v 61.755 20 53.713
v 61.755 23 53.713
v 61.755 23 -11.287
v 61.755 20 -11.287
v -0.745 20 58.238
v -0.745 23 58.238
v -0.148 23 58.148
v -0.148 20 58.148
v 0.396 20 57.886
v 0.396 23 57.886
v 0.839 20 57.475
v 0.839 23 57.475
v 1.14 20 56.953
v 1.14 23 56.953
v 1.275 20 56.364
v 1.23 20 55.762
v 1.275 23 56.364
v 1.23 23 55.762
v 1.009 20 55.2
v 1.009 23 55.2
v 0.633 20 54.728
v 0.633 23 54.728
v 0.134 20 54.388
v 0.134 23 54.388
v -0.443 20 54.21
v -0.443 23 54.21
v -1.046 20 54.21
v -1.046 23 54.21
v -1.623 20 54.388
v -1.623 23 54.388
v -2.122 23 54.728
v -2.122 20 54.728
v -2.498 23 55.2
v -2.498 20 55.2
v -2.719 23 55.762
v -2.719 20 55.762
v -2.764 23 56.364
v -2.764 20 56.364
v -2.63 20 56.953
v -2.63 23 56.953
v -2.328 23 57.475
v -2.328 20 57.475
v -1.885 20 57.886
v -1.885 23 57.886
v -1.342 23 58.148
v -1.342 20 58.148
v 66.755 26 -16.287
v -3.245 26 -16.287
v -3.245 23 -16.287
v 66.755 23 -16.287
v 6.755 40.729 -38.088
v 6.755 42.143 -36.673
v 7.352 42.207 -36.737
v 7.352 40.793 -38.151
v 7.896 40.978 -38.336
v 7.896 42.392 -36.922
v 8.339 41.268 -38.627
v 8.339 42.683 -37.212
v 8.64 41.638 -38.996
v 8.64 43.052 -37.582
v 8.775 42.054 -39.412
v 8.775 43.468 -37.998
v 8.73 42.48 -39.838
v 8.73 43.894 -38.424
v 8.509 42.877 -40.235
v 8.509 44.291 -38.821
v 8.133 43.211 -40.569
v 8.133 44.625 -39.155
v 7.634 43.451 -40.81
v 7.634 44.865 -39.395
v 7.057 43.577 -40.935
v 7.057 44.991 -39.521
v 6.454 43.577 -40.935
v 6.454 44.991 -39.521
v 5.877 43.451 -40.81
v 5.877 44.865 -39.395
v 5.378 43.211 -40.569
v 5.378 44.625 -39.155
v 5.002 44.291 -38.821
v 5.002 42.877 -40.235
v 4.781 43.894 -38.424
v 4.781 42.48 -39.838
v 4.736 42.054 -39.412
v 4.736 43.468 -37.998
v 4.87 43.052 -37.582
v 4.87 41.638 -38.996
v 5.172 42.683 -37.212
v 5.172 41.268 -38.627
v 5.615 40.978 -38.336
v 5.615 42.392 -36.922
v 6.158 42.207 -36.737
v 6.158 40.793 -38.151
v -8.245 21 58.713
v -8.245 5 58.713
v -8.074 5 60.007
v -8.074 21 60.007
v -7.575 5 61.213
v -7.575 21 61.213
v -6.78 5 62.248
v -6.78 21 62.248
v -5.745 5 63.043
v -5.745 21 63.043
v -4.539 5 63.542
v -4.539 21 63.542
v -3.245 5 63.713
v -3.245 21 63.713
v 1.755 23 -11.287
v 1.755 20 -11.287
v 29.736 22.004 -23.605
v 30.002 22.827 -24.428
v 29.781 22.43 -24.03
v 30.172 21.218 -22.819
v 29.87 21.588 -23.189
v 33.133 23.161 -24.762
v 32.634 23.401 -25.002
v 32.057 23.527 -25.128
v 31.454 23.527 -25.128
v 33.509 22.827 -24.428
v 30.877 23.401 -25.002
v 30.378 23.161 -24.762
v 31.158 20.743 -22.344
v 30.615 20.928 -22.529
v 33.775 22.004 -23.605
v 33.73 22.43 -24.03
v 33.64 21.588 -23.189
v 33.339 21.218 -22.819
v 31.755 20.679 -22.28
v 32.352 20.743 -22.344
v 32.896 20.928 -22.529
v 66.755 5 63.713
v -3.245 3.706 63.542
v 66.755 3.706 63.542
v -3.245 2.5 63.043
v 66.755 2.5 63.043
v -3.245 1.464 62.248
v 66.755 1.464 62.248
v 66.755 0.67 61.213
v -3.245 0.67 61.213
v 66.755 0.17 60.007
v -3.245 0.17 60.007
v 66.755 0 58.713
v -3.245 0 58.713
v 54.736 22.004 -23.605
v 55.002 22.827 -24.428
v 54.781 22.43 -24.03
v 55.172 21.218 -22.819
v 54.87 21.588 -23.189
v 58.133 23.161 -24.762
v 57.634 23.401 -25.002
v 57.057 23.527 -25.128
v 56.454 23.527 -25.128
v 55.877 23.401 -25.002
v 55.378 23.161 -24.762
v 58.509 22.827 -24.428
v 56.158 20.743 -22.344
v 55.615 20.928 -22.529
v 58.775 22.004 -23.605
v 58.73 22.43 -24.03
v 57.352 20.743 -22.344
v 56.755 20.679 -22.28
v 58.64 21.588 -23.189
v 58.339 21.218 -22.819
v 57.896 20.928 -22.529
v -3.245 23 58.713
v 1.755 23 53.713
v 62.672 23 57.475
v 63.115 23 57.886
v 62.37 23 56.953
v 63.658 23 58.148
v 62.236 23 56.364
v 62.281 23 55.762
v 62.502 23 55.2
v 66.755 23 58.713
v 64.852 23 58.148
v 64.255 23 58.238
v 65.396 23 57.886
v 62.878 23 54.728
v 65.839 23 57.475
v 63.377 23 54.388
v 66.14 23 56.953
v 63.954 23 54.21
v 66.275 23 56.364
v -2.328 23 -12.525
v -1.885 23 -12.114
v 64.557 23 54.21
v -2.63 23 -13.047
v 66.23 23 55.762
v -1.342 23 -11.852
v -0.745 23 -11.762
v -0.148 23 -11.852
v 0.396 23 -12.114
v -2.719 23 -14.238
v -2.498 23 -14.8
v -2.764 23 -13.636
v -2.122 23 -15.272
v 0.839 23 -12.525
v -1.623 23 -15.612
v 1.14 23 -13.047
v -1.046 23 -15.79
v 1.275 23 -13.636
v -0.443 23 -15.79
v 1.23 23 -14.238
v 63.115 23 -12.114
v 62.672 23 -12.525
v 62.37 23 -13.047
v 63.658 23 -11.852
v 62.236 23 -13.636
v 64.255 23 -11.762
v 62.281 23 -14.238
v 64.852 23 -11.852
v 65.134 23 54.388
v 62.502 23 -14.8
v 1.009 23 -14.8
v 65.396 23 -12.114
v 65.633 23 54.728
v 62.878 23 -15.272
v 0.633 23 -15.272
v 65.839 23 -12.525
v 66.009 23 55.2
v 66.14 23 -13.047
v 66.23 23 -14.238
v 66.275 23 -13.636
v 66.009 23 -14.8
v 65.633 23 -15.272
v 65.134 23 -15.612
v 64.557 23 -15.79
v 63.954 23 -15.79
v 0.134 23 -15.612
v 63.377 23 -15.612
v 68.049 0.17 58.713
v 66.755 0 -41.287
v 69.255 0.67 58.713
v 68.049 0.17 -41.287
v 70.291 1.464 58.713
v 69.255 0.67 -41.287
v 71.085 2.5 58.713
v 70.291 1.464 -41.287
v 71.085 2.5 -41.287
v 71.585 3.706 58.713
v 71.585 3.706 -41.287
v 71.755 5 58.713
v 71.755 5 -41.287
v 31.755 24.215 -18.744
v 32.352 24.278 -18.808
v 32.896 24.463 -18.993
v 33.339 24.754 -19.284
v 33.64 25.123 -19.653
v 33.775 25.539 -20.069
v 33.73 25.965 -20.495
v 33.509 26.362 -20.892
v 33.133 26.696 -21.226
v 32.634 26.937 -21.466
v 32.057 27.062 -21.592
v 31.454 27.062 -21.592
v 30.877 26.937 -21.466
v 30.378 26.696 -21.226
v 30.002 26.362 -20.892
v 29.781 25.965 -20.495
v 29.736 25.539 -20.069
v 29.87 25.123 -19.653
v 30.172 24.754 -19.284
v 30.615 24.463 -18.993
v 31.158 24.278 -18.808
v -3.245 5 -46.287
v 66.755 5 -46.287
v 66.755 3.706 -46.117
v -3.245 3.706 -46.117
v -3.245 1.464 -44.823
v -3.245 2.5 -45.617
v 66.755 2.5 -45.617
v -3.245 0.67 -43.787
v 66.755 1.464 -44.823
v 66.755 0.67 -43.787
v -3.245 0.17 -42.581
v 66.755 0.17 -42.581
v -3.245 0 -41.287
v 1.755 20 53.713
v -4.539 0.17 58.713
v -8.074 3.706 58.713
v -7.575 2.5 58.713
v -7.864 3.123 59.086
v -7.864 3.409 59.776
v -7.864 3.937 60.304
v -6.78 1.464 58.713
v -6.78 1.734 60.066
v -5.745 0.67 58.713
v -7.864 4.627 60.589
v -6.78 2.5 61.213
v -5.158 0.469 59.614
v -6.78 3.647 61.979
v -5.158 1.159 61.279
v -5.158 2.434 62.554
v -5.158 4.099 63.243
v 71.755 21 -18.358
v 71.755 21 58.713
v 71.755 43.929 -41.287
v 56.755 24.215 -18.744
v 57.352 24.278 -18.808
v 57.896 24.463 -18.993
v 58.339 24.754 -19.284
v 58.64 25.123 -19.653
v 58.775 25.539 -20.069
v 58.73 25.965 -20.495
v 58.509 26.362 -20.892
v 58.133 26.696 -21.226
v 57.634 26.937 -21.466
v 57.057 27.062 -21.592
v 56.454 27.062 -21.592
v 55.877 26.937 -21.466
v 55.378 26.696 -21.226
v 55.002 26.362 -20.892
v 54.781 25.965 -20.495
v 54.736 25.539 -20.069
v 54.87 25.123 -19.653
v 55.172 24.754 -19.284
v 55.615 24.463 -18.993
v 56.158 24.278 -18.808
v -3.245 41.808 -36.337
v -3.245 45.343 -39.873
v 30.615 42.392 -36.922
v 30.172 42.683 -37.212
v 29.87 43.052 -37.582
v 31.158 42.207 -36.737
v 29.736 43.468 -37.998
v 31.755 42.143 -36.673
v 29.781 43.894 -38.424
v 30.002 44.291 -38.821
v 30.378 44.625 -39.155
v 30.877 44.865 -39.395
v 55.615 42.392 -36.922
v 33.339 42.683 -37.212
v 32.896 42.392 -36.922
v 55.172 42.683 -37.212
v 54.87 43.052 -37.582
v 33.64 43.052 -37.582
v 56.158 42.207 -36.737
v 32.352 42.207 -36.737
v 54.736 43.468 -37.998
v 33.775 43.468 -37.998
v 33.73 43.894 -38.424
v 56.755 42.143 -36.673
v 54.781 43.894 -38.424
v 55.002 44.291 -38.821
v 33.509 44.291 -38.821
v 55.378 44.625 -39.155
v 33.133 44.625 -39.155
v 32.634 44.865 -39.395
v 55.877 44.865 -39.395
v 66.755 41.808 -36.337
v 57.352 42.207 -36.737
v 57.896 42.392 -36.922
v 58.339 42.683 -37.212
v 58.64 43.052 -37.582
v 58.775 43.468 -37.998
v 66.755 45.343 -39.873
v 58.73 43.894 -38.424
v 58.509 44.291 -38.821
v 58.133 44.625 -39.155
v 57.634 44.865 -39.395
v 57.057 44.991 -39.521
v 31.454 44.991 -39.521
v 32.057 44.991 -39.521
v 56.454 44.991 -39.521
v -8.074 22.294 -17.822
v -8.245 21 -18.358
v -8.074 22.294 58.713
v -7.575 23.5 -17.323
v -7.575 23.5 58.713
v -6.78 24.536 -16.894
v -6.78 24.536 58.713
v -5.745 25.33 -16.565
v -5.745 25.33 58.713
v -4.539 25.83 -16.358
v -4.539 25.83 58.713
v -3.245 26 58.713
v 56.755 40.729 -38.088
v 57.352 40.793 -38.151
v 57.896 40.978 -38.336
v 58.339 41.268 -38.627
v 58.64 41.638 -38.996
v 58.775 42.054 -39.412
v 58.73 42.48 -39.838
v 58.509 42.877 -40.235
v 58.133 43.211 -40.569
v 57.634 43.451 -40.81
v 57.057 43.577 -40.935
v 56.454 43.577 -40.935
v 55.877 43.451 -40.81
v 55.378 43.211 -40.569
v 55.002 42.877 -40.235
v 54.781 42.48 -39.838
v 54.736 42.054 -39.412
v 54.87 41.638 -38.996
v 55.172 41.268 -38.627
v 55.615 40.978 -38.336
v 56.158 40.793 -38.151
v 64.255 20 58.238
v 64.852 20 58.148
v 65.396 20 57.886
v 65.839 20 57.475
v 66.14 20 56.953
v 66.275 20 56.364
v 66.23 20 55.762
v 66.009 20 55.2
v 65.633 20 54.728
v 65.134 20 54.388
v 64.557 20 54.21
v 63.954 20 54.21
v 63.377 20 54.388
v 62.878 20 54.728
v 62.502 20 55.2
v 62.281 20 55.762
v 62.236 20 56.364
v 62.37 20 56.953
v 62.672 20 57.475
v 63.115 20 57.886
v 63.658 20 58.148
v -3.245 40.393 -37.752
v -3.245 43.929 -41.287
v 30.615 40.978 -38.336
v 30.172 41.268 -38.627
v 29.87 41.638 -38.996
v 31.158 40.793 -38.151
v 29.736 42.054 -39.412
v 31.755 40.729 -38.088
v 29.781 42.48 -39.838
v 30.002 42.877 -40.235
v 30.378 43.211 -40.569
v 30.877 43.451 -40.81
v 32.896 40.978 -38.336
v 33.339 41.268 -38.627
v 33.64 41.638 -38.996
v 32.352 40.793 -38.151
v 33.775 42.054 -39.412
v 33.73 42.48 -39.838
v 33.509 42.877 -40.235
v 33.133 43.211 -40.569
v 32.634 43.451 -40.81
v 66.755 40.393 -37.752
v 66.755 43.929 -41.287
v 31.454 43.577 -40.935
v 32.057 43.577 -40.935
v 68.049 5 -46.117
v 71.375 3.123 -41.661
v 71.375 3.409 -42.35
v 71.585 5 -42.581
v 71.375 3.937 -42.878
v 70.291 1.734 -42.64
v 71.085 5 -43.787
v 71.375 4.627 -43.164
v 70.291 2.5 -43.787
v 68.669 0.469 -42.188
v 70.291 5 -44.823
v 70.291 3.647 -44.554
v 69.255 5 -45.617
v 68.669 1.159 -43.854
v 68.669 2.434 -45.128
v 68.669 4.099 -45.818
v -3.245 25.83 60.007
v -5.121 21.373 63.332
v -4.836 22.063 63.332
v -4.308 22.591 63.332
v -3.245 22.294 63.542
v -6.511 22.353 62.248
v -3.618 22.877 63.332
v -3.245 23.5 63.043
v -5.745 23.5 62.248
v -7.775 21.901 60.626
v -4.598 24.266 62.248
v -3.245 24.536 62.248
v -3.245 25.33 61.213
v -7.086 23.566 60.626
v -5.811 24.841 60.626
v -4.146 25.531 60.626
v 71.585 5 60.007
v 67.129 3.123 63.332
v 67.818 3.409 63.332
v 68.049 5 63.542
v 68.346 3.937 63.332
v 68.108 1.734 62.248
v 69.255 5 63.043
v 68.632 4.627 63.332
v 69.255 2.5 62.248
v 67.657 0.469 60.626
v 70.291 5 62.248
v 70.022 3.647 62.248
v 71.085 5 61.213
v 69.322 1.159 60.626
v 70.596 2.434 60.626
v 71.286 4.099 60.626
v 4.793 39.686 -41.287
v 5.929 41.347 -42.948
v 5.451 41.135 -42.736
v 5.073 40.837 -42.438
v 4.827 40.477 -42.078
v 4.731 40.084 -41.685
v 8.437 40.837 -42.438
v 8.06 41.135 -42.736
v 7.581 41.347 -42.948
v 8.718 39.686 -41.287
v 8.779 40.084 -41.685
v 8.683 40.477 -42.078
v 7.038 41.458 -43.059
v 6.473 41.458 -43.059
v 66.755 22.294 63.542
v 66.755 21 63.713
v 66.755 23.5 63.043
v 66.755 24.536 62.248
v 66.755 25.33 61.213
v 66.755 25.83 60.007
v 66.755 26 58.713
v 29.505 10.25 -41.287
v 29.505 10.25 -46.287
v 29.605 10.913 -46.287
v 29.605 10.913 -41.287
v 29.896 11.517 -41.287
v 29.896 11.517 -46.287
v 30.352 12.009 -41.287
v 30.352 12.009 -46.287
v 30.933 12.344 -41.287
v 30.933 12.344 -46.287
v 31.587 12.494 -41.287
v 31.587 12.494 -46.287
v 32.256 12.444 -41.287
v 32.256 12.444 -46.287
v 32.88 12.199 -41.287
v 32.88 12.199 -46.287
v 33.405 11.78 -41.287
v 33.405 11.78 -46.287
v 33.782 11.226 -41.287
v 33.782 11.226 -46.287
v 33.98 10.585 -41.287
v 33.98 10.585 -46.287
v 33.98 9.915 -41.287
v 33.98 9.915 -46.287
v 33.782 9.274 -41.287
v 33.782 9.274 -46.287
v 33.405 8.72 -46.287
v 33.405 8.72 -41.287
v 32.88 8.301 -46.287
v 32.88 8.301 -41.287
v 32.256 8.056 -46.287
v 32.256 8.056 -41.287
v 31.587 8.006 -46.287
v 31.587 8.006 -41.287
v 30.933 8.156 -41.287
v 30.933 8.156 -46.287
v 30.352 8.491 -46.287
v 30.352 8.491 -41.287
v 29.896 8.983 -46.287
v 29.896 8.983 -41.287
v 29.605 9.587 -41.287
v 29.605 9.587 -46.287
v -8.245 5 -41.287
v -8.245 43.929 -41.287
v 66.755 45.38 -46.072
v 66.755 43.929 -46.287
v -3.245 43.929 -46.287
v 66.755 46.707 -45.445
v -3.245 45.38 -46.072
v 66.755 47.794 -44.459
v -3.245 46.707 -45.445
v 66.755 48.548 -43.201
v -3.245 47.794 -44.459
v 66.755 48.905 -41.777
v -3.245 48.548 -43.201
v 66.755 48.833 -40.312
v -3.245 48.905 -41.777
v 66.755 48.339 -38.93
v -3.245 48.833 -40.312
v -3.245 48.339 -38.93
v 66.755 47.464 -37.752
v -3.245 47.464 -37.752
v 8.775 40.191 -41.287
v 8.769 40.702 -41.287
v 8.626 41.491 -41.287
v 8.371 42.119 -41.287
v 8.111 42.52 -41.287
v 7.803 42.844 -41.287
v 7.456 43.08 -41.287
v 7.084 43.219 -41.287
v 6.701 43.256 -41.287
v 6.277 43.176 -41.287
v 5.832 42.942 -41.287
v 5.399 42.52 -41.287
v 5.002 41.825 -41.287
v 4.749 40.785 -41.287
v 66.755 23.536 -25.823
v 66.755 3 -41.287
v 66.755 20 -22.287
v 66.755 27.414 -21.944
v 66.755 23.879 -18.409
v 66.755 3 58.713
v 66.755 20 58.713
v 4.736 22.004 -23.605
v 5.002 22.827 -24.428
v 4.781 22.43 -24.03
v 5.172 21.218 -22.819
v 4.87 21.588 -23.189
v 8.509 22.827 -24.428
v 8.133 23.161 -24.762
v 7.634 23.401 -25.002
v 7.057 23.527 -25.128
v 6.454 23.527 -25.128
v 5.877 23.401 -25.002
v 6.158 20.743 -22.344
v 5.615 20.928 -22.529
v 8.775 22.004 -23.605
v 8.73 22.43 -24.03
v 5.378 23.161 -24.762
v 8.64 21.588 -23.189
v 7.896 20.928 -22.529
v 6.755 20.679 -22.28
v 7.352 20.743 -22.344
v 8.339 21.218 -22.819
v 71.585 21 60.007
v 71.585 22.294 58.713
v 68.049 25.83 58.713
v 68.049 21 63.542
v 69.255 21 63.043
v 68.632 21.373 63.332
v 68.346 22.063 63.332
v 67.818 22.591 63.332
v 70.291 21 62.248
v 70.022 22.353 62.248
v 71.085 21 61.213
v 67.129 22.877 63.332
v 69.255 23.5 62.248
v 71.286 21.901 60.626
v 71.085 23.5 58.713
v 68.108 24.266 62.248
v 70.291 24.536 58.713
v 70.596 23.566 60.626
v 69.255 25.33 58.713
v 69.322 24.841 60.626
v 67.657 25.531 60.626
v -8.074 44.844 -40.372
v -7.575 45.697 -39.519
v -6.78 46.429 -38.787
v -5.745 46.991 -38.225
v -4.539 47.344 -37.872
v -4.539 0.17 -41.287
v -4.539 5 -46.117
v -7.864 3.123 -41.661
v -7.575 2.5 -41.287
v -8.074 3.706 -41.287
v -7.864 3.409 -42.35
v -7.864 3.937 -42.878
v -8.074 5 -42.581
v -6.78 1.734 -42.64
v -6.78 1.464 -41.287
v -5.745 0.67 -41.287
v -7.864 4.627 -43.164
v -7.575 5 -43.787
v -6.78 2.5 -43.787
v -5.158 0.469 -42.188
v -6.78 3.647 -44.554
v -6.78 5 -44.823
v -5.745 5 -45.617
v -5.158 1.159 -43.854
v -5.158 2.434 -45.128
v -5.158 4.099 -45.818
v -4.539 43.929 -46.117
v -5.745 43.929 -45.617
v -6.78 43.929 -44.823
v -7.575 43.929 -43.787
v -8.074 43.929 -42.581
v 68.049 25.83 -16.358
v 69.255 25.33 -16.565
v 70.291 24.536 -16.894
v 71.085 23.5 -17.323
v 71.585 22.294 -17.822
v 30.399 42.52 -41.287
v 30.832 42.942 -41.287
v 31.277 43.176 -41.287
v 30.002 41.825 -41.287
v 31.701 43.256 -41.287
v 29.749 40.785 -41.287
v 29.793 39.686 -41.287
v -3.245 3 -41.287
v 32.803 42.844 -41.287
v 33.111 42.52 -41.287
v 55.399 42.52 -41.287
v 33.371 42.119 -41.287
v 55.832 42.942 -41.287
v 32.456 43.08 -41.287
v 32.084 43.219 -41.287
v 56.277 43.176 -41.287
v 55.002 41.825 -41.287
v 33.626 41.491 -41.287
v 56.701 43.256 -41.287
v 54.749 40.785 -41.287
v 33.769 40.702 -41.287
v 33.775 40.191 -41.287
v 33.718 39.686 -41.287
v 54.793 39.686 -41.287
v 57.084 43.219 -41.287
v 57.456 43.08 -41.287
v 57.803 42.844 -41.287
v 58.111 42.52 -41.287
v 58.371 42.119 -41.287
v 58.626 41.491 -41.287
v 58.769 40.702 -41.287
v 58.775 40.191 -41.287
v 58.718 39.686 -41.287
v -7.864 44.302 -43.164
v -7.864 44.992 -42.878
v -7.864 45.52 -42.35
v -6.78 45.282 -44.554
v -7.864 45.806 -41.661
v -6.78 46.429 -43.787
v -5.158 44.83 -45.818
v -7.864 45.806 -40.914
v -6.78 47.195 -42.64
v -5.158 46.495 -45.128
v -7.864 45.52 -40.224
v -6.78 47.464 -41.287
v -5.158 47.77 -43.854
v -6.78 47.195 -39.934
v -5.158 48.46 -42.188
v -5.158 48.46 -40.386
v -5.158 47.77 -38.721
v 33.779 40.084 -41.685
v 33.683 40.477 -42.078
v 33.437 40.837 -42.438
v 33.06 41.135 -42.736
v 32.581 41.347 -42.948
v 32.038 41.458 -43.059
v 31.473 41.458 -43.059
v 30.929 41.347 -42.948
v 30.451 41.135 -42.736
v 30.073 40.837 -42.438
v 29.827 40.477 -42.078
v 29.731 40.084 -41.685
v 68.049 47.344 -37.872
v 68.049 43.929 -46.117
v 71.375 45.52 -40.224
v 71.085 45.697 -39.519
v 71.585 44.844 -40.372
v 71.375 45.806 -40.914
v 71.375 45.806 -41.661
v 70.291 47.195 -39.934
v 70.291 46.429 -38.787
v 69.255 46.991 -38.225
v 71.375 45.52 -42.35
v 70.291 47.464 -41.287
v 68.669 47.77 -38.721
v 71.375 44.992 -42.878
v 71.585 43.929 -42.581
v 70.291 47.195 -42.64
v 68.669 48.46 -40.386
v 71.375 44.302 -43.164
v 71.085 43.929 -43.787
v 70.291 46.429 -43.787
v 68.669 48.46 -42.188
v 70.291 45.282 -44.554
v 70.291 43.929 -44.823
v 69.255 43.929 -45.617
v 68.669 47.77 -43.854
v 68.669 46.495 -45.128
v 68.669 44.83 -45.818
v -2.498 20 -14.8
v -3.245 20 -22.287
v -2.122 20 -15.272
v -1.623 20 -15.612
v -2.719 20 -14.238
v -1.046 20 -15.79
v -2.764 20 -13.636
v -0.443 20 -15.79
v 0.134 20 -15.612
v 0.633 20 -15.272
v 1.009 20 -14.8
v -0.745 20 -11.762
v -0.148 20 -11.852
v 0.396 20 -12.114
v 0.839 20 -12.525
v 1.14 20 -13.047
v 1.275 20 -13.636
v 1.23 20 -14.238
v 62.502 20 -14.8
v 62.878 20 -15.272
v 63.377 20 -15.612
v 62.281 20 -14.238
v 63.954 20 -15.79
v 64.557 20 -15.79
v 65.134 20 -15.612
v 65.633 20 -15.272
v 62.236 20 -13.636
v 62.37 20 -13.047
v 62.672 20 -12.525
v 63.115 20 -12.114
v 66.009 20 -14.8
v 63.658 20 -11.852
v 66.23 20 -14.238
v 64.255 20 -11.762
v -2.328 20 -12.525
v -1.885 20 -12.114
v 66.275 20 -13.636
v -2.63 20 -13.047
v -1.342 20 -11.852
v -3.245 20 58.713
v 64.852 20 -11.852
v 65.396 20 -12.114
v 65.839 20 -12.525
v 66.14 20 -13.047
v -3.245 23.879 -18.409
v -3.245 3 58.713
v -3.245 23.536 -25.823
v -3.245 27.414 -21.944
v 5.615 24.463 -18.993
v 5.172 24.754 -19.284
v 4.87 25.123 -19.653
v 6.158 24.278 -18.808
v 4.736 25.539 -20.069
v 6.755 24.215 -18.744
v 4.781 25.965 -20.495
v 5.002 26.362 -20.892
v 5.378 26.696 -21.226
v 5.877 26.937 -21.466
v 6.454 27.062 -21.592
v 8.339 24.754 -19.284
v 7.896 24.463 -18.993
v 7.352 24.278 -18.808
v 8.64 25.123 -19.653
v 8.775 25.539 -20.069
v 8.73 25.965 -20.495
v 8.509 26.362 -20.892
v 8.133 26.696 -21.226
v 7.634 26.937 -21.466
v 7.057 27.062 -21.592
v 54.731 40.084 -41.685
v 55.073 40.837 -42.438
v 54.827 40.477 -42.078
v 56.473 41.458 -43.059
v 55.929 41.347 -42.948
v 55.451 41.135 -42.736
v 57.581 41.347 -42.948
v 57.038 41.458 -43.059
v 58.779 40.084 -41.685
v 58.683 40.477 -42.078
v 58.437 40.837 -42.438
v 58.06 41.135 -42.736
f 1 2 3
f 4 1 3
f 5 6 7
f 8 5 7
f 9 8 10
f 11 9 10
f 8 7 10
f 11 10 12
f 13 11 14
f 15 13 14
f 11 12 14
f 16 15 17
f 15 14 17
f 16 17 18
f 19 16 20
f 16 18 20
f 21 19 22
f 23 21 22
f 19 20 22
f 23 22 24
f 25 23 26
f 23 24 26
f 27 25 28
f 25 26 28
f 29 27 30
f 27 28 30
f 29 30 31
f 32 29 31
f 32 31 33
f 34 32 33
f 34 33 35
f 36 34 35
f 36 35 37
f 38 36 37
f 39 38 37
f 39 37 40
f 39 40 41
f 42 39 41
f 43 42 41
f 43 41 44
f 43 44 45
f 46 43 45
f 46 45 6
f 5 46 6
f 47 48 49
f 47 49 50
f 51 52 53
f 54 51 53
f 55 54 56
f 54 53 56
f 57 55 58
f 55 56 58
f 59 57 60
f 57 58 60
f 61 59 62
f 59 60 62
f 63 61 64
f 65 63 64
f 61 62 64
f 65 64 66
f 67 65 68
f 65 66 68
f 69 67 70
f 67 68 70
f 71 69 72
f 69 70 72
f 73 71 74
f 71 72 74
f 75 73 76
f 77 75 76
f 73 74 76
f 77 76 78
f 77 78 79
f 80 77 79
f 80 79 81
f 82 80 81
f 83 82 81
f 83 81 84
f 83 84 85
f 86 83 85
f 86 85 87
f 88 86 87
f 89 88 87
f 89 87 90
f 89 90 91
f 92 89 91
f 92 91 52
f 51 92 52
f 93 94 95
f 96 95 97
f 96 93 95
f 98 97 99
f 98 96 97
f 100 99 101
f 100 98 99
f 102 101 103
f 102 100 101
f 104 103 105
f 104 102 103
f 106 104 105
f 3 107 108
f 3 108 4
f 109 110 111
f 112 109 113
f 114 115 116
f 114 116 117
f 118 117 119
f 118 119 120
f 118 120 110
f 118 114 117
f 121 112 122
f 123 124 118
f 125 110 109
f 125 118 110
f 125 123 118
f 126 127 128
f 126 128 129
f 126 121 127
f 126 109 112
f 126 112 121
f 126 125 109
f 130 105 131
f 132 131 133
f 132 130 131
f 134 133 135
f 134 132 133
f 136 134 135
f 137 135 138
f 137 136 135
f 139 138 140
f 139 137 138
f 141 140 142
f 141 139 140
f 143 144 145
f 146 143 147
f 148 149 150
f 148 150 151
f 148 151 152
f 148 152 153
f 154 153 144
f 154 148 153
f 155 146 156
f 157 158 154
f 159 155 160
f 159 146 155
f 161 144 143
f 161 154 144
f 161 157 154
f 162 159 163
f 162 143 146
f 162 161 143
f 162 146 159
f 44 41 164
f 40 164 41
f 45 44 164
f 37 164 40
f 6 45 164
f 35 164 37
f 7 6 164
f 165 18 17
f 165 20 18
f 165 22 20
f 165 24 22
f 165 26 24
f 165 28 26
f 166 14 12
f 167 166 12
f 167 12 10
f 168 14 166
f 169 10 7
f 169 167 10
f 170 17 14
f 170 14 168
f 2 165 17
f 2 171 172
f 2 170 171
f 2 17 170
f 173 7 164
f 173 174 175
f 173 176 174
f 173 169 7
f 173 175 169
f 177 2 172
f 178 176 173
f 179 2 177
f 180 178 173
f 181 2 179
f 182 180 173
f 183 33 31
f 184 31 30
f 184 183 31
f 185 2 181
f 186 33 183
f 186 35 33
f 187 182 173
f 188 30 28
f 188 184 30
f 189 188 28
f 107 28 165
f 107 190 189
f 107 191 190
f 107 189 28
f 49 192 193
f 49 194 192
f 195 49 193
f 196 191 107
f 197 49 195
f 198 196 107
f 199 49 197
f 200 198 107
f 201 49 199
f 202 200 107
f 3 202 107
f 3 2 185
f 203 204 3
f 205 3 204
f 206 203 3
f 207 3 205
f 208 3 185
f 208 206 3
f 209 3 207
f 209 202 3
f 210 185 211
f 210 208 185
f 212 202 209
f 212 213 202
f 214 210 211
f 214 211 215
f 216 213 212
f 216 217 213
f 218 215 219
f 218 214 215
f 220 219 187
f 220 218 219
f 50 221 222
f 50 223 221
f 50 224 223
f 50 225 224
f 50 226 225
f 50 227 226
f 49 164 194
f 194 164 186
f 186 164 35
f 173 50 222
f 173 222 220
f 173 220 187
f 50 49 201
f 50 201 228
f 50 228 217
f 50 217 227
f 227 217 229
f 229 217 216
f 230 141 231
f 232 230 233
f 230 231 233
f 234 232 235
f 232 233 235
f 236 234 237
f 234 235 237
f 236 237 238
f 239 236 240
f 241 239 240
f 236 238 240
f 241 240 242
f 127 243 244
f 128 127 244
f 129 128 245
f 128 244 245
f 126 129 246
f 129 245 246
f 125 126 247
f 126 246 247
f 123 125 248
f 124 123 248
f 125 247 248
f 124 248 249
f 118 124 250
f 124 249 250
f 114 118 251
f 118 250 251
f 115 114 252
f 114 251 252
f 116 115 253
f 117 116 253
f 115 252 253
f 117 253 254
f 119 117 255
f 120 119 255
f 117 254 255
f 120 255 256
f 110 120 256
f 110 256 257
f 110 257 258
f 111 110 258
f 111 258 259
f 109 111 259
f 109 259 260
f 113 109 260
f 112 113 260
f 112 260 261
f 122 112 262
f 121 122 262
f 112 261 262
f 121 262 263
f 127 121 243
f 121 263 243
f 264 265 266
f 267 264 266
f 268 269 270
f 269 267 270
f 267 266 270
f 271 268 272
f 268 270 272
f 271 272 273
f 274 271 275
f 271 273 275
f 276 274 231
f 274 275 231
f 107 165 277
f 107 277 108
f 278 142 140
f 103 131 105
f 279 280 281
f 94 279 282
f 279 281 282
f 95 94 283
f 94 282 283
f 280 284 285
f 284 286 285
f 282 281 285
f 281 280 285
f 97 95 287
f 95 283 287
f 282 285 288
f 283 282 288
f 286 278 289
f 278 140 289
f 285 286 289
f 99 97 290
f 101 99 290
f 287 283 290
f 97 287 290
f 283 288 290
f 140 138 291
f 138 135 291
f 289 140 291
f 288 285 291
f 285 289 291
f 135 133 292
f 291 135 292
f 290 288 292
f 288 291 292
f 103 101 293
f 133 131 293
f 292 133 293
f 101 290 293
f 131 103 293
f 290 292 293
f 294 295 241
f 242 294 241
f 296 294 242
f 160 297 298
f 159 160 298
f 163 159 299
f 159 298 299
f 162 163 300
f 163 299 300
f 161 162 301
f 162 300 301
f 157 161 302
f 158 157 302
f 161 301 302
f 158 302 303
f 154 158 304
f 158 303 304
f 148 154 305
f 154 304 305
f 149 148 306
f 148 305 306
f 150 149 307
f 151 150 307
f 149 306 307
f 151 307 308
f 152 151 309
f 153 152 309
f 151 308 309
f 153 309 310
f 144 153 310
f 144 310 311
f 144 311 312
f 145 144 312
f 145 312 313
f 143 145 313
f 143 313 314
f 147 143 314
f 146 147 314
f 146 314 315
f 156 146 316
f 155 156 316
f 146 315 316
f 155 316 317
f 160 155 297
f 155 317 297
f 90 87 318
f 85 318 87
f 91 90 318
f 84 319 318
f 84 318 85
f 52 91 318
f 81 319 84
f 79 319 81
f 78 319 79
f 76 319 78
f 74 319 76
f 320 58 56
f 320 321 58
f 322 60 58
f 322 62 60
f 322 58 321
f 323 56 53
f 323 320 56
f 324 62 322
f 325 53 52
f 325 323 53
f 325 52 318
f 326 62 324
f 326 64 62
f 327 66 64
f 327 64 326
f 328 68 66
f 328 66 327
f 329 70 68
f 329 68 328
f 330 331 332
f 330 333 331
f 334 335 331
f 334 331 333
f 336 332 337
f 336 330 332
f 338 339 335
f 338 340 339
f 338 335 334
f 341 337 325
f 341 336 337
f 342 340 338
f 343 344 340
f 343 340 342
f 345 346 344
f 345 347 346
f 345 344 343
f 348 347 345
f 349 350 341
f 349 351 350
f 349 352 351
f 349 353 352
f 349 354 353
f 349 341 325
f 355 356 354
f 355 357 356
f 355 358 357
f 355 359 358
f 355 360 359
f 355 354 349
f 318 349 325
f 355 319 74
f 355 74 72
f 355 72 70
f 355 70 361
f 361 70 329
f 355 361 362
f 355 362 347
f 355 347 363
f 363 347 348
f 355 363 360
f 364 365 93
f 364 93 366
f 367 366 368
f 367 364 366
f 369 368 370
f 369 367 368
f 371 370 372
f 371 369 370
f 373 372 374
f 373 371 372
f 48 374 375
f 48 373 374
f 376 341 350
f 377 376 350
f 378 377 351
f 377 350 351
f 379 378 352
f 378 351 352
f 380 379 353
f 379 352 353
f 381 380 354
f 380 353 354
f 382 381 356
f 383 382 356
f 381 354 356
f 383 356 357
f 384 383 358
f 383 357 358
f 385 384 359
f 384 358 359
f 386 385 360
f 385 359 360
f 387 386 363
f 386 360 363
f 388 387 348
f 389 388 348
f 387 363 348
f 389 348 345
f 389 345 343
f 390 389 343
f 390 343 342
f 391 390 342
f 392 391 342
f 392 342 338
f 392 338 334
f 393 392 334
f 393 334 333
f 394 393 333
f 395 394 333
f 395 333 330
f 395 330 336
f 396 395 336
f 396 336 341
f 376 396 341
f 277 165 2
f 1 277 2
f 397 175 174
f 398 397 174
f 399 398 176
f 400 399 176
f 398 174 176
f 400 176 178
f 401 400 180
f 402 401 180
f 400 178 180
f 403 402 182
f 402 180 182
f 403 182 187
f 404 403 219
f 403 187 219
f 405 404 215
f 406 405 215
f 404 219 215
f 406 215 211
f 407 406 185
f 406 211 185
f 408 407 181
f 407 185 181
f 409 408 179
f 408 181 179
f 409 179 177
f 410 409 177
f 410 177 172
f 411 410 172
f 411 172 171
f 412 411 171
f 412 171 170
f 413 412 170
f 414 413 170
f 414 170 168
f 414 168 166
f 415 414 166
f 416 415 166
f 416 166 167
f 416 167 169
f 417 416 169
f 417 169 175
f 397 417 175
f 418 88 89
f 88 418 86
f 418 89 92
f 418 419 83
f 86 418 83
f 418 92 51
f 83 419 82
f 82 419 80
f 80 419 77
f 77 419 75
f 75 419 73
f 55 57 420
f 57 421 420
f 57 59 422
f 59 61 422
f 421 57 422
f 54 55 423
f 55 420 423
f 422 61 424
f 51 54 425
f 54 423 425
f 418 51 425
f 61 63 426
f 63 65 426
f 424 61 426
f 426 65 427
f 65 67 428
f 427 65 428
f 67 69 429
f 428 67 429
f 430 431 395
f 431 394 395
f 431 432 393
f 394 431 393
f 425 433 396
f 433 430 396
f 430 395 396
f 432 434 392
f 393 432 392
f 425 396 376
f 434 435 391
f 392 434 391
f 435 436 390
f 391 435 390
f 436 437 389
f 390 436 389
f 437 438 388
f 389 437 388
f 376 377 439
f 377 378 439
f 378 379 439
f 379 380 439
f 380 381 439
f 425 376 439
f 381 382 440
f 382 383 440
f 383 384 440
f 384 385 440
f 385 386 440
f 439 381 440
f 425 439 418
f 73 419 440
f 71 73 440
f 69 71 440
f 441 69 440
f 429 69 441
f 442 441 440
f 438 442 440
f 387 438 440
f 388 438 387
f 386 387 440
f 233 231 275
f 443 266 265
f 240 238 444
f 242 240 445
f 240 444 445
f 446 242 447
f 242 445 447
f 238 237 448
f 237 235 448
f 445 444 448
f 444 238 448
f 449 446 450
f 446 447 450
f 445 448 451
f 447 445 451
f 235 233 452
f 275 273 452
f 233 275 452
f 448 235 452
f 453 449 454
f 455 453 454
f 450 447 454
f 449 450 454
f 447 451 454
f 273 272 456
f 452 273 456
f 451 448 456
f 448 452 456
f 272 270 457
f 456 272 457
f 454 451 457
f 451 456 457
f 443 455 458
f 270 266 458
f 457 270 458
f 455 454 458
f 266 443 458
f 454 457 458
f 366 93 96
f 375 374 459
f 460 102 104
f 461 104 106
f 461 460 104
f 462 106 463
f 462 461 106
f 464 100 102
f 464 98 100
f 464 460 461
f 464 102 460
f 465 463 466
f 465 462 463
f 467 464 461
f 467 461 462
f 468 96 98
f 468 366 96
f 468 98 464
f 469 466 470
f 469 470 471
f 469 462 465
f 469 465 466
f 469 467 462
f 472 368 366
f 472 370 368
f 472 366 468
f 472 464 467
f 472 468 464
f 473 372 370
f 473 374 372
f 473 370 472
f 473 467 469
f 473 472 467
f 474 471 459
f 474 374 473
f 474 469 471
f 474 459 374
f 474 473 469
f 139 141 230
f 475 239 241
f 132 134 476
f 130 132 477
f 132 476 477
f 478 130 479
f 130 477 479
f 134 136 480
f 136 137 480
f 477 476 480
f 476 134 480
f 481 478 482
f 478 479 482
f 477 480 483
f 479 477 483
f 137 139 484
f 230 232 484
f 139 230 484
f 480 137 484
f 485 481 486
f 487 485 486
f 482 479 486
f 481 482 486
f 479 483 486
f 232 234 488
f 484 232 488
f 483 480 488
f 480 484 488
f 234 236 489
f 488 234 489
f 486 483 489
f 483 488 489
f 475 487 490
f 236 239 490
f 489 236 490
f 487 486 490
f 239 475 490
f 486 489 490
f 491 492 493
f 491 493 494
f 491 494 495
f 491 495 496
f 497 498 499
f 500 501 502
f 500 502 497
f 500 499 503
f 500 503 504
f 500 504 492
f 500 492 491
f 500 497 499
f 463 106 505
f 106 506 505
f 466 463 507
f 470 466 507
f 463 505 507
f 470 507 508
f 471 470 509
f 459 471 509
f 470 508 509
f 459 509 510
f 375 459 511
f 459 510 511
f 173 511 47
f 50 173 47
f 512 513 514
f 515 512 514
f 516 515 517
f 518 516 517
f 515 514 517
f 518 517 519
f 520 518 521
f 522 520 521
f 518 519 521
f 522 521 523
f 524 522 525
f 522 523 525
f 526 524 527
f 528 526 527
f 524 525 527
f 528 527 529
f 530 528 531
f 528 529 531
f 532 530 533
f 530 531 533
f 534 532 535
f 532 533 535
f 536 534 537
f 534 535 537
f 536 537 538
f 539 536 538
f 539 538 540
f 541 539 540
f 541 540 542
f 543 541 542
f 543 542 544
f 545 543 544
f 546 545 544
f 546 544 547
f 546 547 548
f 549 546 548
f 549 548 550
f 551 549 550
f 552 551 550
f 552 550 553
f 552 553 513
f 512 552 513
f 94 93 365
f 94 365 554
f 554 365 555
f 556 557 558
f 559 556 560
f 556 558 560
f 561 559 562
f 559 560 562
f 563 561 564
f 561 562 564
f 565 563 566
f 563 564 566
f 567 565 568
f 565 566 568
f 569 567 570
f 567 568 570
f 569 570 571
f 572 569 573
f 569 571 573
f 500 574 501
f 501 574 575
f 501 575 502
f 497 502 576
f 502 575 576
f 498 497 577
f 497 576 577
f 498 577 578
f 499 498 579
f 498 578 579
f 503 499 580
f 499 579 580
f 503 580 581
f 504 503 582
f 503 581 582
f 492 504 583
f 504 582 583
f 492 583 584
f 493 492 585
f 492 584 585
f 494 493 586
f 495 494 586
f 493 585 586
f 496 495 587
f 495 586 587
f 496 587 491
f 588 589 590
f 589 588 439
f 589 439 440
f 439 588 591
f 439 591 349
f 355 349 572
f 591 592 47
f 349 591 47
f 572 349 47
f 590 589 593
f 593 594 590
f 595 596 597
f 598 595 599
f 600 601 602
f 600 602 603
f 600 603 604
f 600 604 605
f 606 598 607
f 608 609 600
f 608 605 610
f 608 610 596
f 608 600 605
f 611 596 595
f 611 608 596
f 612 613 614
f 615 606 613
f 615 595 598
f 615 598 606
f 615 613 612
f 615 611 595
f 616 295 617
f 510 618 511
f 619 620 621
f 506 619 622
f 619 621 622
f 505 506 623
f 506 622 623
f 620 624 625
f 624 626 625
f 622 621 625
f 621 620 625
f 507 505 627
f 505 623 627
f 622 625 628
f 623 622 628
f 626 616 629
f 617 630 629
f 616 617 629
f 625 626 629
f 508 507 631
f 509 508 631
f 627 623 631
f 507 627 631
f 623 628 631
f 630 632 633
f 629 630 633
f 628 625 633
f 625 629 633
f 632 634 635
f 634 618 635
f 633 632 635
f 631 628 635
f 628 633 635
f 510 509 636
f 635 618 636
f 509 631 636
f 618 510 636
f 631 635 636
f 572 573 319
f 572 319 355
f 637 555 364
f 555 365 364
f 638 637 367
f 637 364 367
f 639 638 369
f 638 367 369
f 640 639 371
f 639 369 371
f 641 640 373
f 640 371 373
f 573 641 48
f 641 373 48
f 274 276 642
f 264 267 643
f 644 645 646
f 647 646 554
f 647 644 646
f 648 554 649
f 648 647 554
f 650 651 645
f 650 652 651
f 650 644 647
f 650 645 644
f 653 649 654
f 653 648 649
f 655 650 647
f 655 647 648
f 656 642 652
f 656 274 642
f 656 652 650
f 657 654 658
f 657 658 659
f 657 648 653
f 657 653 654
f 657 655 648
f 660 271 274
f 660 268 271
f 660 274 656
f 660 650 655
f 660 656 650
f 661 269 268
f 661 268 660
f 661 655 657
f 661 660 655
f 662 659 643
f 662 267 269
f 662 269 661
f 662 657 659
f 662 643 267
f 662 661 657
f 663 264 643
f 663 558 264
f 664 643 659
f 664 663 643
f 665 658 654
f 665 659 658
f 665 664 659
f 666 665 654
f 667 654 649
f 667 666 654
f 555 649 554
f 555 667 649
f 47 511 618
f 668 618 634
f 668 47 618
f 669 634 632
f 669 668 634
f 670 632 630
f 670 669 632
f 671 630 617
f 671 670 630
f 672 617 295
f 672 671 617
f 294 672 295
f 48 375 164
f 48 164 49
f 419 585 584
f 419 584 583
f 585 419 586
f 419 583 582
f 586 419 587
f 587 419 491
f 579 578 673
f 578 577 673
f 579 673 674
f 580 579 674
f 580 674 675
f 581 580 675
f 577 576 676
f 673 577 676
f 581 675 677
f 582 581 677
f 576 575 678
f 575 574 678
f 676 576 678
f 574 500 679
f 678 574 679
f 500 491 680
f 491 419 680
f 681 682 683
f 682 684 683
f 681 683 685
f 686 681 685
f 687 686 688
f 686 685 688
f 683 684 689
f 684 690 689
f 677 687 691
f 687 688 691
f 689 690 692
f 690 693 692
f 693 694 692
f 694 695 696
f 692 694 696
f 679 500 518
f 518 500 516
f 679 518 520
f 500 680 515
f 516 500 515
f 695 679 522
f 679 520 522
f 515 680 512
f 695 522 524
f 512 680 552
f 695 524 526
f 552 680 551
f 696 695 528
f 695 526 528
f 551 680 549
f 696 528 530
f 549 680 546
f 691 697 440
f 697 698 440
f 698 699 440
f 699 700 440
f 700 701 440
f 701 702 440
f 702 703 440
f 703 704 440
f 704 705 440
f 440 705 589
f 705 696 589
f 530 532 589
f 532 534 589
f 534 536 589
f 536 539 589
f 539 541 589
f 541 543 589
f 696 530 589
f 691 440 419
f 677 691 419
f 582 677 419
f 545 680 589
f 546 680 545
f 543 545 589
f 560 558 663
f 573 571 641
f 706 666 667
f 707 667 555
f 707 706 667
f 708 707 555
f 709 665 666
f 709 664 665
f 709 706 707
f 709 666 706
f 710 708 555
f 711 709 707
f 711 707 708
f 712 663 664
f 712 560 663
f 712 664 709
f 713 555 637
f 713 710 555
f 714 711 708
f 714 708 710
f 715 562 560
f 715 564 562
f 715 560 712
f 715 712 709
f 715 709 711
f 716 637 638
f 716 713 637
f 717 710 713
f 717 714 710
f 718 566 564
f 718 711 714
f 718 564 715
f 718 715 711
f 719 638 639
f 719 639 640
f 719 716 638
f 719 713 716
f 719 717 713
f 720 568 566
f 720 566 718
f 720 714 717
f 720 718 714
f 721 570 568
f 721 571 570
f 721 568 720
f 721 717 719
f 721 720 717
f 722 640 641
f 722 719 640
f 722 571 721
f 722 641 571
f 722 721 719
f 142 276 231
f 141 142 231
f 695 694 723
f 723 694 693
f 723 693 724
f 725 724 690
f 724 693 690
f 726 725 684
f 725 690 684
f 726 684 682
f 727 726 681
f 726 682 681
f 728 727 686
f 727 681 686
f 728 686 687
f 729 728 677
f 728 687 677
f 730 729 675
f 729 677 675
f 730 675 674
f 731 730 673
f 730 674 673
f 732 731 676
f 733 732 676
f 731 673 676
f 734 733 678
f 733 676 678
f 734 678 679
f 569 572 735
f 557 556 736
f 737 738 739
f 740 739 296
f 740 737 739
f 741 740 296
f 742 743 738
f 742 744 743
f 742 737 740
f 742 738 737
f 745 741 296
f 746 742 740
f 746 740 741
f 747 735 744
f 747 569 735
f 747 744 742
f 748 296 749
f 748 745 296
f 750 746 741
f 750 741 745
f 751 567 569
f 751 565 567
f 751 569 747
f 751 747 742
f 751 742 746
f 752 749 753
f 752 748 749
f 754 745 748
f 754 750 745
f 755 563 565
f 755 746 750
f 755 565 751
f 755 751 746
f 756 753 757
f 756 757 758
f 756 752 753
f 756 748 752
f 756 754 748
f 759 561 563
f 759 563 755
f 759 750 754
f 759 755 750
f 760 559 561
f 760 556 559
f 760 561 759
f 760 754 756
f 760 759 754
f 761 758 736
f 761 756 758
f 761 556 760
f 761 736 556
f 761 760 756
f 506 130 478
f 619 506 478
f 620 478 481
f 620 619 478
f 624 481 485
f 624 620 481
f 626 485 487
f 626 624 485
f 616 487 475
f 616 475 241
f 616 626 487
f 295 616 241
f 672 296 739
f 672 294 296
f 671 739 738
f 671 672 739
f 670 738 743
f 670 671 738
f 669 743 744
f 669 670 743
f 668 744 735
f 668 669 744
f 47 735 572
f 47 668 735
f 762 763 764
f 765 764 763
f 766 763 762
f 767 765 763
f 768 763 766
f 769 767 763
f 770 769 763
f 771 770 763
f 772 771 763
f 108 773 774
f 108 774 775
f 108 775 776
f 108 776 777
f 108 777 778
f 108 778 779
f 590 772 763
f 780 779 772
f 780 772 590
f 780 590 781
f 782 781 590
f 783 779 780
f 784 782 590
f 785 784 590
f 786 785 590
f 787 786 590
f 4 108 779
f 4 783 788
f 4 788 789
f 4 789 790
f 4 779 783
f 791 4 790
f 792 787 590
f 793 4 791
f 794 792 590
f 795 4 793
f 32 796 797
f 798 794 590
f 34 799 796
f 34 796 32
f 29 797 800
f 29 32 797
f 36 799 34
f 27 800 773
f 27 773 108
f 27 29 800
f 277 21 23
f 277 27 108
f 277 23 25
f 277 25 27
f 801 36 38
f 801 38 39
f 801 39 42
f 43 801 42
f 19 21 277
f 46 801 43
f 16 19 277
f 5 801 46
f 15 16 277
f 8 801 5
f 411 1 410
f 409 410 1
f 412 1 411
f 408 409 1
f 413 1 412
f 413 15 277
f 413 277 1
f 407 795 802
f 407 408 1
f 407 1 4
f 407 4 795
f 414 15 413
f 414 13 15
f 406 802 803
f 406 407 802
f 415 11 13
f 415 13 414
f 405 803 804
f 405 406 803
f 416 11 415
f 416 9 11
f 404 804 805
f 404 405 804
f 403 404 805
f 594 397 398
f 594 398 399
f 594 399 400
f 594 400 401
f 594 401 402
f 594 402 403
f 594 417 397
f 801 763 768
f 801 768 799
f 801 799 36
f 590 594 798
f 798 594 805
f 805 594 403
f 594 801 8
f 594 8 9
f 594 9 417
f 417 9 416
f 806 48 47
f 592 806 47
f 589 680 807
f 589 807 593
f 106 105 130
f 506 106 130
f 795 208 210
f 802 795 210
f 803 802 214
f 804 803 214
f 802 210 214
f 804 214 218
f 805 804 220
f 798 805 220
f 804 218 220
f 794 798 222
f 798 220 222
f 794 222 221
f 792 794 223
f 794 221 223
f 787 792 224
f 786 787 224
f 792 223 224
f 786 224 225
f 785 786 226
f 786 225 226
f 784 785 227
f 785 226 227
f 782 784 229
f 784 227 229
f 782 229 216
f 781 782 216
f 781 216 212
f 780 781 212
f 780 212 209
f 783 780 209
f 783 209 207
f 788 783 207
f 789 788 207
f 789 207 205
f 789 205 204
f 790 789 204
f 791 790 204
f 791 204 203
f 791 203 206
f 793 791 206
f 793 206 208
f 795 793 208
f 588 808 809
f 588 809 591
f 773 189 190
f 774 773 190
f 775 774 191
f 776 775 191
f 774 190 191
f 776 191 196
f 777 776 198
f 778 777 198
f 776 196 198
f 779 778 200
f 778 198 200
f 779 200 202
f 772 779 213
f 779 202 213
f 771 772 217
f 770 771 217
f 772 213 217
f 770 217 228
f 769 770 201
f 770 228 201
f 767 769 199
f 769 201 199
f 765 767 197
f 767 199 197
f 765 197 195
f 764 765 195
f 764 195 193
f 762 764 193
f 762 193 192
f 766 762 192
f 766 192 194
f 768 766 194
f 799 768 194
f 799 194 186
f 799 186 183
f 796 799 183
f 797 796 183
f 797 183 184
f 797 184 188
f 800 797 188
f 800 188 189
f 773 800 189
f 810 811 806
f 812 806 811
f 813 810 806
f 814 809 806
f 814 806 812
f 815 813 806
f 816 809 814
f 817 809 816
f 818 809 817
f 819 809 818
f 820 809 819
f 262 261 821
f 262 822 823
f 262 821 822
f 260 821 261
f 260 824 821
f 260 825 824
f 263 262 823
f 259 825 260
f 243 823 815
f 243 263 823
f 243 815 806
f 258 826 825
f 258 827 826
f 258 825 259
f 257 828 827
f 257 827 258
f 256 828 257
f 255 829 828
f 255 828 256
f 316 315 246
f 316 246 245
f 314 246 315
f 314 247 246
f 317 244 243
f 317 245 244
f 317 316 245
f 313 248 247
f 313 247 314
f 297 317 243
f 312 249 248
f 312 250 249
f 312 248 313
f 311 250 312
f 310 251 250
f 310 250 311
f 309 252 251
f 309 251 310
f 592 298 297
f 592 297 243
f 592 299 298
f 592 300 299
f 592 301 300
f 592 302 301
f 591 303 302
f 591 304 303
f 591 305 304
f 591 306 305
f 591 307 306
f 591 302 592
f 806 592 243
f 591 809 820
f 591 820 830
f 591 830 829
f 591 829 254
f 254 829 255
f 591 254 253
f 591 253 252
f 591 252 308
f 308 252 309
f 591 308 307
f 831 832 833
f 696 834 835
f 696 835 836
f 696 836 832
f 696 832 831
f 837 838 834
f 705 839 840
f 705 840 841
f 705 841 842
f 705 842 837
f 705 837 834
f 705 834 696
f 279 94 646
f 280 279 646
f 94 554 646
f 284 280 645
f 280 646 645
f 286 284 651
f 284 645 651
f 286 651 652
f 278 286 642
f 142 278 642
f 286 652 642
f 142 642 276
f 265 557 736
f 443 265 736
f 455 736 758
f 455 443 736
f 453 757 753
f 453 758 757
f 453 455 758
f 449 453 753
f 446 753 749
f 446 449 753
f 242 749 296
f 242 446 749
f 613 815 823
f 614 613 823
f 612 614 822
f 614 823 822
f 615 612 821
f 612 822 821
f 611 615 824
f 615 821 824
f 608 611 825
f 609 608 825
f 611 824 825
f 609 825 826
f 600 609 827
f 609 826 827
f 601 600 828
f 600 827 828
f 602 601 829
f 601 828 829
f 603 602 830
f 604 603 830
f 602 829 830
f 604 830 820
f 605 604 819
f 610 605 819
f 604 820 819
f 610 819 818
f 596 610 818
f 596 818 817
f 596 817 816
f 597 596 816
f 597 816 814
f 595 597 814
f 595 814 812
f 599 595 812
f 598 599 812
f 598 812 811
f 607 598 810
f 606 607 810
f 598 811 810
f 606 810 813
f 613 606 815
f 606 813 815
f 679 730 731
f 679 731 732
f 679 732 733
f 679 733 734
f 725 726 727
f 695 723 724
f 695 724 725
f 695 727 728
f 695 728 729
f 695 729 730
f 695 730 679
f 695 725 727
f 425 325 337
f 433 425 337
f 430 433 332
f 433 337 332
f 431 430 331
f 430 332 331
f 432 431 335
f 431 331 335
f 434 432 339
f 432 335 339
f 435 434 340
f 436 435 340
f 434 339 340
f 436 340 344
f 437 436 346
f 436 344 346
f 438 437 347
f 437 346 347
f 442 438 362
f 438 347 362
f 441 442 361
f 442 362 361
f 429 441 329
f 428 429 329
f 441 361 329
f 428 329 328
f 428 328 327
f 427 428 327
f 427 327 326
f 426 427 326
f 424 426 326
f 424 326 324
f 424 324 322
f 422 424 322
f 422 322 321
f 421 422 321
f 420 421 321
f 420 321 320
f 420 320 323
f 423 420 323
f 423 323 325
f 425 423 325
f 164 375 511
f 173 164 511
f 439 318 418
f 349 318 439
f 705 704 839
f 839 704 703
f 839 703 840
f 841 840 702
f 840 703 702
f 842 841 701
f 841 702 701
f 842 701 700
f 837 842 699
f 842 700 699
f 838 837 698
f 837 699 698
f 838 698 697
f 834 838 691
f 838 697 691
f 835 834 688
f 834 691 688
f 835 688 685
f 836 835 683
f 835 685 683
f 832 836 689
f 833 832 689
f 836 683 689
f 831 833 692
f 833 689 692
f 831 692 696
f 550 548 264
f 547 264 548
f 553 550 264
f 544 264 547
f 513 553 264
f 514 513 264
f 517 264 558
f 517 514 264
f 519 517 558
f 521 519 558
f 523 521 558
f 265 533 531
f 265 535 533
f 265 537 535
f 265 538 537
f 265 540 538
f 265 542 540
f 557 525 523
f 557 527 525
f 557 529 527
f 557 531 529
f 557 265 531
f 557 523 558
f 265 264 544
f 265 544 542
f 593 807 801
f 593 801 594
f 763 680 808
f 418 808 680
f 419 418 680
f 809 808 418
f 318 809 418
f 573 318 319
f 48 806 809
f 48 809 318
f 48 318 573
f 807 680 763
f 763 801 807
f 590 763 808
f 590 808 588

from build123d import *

# Parameters (mm, degrees)
SKETCH_1_W          = 80
SKETCH_1_H          = 110
EXTRUDE_1_DEPTH     = 26
EXTRUDE_2_DEPTH     = 80
FILLET_1_R          = 5
SKETCH_4_W          = 70
SKETCH_4_H          = 100
CUT_EXTRUDE_1_DEPTH = 20
CUT_EXTRUDE_2_REACH = 129.08
SKETCH_6_W          = 70
SKETCH_6_H          = 30.355339059
SKETCH_8_W          = 60
SKETCH_8_H          = 65
CUT_EXTRUDE_3_DEPTH = 20
SKETCH_9_W          = 70
SKETCH_9_H          = 8.485281375
EXTRUDE_3_DEPTH     = 5
SKETCH_11_W         = 70
SKETCH_11_H         = 5
EXTRUDE_4_DEPTH     = 5
SKETCH_13_W         = 70
SKETCH_13_H         = 75
CUT_EXTRUDE_4_DEPTH = 3
SKETCH_14_W         = 70
SKETCH_14_H         = 30.355339059
CUT_EXTRUDE_5_DEPTH = 3
SKETCH_15_W         = 70
SKETCH_15_H         = 3
EXTRUDE_5_DEPTH     = 100
SKETCH_16_R         = 2.025
CUT_EXTRUDE_6_DEPTH = 5
SKETCH_17_R         = 2.025
CUT_EXTRUDE_7_DEPTH = 5
SKETCH_18_R         = 2.25
CUT_EXTRUDE_8_DEPTH = 45


with BuildPart() as part:
    # 草圖1 → 填料-伸長1 (new body)
    with BuildSketch(Plane(origin=(0, 0, 0), x_dir=(1, 0, 0), z_dir=(0, 1, 0))):
        with Locations((31.755319149, -8.712765957)):
            Rectangle(SKETCH_1_W, SKETCH_1_H)
    extrude(amount=EXTRUDE_1_DEPTH)

    # 草圖2 → 填料-伸長2 (add)
    with BuildSketch(Plane(origin=(71.755319149, 0, 0), x_dir=(0, 0, -1), z_dir=(1, 0, 0))):
        Polygon((46.287234043, 26), (46.287234043, 56), (16.287234043, 26), align=None)
    extrude(amount=-EXTRUDE_2_DEPTH)

    # 圓角1
    fillet_1_edges = [part.edges().sort_by_distance(p)[0] for p in [
        (31.755319149, 26, 63.712765957),
        (71.755319149, 26, 23.712765957),
        (71.755319149, 41, -31.287234043),
        (-8.244680851, 41, -31.287234043),
        (31.755319149, 56, -46.287234043),
        (-8.244680851, 26, 23.712765957),
        (31.755319149, 0, -46.287234043),
        (-8.244680851, 28, -46.287234043),
        (-8.244680851, 0, 8.712765957),
        (71.755319149, 28, -46.287234043),
        (71.755319149, 0, 8.712765957),
        (-8.244680851, 13, 63.712765957),
        (71.755319149, 13, 63.712765957),
        (31.755319149, 0, 63.712765957),
    ]]
    fillet(fillet_1_edges, radius=FILLET_1_R)

    # 草圖4 → 除料-伸長1 (cut)
    with BuildSketch(Plane.XZ):
        with Locations((31.755319149, 8.712765957)):
            Rectangle(SKETCH_4_W, SKETCH_4_H)
    extrude(amount=-CUT_EXTRUDE_1_DEPTH, mode=Mode.SUBTRACT)

    # 除料-伸長2: up to this plane
    cut_extrude_2_end = Plane(origin=(0, 0, -41.287234043), z_dir=(0, 0, -1))
    # 草圖6 → 除料-伸長2 (cut, up to the surface)
    with BuildSketch(Plane(origin=(0, 4.856382979, 4.856382979), x_dir=(1, 0, 0), z_dir=(0, 0.7071067811865439, 0.7071067811865511)), mode=Mode.PRIVATE) as cut_extrude_2_sk1:
        with Locations((31.755319149, 45.079259479)):
            Rectangle(SKETCH_6_W, SKETCH_6_H)
    cut_extrude_2_tool1 = split(extrude(cut_extrude_2_sk1.sketch, amount=-CUT_EXTRUDE_2_REACH, mode=Mode.PRIVATE), bisect_by=cut_extrude_2_end, keep=Keep.BOTH, mode=Mode.PRIVATE)
    add(cut_extrude_2_tool1.solids().sort_by_distance((31.755319, 36.732233, -27.019467))[0], mode=Mode.SUBTRACT)

    # 草圖8 → 除料-伸長3 (cut)
    with BuildSketch(Plane(origin=(0, 26, 0), x_dir=(1, 0, 0), z_dir=(0, 1, 0))):
        with Locations((31.755319149, -21.212765957)):
            Rectangle(SKETCH_8_W, SKETCH_8_H)
    extrude(amount=-CUT_EXTRUDE_3_DEPTH, mode=Mode.SUBTRACT)

    # 草圖9 → 填料-伸長3 (add)
    with BuildSketch(Plane(origin=(0, 21.143617021, -21.143617021), x_dir=(1, 0, 0), z_dir=(0, 0.7071067811865511, -0.707106781186544))):
        with Locations((31.755319149, -2.625321985)):
            Rectangle(SKETCH_9_W, SKETCH_9_H)
    extrude(amount=EXTRUDE_3_DEPTH)

    # 草圖11 → 填料-伸長4 (add)
    with BuildSketch(Plane(origin=(0, 42.608083115, -42.608083115), x_dir=(1, 0, 0), z_dir=(0, -0.7071067811865511, 0.707106781186544))):
        with Locations((31.755319149, 4.367962673)):
            Rectangle(SKETCH_11_W, SKETCH_11_H)
    extrude(amount=EXTRUDE_4_DEPTH)

    # 草圖13 → 除料-伸長4 (cut)
    with BuildSketch(Plane(origin=(0, 26, 0), x_dir=(1, 0, 0), z_dir=(0, 1, 0))):
        with Locations((31.755319149, -21.212765957)):
            Rectangle(SKETCH_13_W, SKETCH_13_H)
    extrude(amount=-CUT_EXTRUDE_4_DEPTH, mode=Mode.SUBTRACT)

    # 草圖14 → 除料-伸長5 (cut)
    with BuildSketch(Plane(origin=(0, 4.856382979, 4.856382979), x_dir=(1, 0, 0), z_dir=(0, 0.7071067811865441, 0.7071067811865509))):
        with Locations((31.755319149, 45.079259479)):
            Rectangle(SKETCH_14_W, SKETCH_14_H)
    extrude(amount=-CUT_EXTRUDE_5_DEPTH, mode=Mode.SUBTRACT)

    # 草圖15 → 填料-伸長5 (add)
    with BuildSketch(Plane.XY.offset(-41.287234043)):
        with Locations((31.755319149, 1.5)):
            Rectangle(SKETCH_15_W, SKETCH_15_H)
    extrude(amount=EXTRUDE_5_DEPTH)

    # 草圖16 → 除料-伸長6 (cut)
    with BuildSketch(Plane(origin=(0, 2.735062635, 2.735062635), x_dir=(1, 0, 0), z_dir=(0, 0.7071067811865444, 0.7071067811865508))):
        with Locations((6.755319149, 57.756929008)):
            Circle(SKETCH_16_R)
        with Locations((56.755319149, 57.756929008)):
            Circle(SKETCH_16_R)
        with Locations((31.755319149, 57.756929008)):
            Circle(SKETCH_16_R)
        with Locations((6.755319149, 32.401589949)):
            Circle(SKETCH_16_R)
        with Locations((56.755319149, 32.401589949)):
            Circle(SKETCH_16_R)
        with Locations((31.755319149, 32.401589949)):
            Circle(SKETCH_16_R)
    extrude(amount=-CUT_EXTRUDE_6_DEPTH, mode=Mode.SUBTRACT)

    # 草圖17 → 除料-伸長7 (cut)
    with BuildSketch(Plane(origin=(0, 23, 0), x_dir=(1, 0, 0), z_dir=(0, 1, 0))):
        with Locations((-0.744680851, 13.787234043)):
            Circle(SKETCH_17_R)
        with Locations((64.255319149, -56.212765957)):
            Circle(SKETCH_17_R)
        with Locations((-0.744680851, -56.212765957)):
            Circle(SKETCH_17_R)
        with Locations((64.255319149, 13.787234043)):
            Circle(SKETCH_17_R)
    extrude(amount=-CUT_EXTRUDE_7_DEPTH, mode=Mode.SUBTRACT)

    # 草圖18 → 除料-伸長8 (cut)
    with BuildSketch(Plane(origin=(0, 0, -46.287234043), x_dir=(-1, 0, 0), z_dir=(0, 0, -1))):
        with Locations((-31.755319149, 10.25)):
            Circle(SKETCH_18_R)
    extrude(amount=-CUT_EXTRUDE_8_DEPTH, mode=Mode.SUBTRACT)


solid = part.part
